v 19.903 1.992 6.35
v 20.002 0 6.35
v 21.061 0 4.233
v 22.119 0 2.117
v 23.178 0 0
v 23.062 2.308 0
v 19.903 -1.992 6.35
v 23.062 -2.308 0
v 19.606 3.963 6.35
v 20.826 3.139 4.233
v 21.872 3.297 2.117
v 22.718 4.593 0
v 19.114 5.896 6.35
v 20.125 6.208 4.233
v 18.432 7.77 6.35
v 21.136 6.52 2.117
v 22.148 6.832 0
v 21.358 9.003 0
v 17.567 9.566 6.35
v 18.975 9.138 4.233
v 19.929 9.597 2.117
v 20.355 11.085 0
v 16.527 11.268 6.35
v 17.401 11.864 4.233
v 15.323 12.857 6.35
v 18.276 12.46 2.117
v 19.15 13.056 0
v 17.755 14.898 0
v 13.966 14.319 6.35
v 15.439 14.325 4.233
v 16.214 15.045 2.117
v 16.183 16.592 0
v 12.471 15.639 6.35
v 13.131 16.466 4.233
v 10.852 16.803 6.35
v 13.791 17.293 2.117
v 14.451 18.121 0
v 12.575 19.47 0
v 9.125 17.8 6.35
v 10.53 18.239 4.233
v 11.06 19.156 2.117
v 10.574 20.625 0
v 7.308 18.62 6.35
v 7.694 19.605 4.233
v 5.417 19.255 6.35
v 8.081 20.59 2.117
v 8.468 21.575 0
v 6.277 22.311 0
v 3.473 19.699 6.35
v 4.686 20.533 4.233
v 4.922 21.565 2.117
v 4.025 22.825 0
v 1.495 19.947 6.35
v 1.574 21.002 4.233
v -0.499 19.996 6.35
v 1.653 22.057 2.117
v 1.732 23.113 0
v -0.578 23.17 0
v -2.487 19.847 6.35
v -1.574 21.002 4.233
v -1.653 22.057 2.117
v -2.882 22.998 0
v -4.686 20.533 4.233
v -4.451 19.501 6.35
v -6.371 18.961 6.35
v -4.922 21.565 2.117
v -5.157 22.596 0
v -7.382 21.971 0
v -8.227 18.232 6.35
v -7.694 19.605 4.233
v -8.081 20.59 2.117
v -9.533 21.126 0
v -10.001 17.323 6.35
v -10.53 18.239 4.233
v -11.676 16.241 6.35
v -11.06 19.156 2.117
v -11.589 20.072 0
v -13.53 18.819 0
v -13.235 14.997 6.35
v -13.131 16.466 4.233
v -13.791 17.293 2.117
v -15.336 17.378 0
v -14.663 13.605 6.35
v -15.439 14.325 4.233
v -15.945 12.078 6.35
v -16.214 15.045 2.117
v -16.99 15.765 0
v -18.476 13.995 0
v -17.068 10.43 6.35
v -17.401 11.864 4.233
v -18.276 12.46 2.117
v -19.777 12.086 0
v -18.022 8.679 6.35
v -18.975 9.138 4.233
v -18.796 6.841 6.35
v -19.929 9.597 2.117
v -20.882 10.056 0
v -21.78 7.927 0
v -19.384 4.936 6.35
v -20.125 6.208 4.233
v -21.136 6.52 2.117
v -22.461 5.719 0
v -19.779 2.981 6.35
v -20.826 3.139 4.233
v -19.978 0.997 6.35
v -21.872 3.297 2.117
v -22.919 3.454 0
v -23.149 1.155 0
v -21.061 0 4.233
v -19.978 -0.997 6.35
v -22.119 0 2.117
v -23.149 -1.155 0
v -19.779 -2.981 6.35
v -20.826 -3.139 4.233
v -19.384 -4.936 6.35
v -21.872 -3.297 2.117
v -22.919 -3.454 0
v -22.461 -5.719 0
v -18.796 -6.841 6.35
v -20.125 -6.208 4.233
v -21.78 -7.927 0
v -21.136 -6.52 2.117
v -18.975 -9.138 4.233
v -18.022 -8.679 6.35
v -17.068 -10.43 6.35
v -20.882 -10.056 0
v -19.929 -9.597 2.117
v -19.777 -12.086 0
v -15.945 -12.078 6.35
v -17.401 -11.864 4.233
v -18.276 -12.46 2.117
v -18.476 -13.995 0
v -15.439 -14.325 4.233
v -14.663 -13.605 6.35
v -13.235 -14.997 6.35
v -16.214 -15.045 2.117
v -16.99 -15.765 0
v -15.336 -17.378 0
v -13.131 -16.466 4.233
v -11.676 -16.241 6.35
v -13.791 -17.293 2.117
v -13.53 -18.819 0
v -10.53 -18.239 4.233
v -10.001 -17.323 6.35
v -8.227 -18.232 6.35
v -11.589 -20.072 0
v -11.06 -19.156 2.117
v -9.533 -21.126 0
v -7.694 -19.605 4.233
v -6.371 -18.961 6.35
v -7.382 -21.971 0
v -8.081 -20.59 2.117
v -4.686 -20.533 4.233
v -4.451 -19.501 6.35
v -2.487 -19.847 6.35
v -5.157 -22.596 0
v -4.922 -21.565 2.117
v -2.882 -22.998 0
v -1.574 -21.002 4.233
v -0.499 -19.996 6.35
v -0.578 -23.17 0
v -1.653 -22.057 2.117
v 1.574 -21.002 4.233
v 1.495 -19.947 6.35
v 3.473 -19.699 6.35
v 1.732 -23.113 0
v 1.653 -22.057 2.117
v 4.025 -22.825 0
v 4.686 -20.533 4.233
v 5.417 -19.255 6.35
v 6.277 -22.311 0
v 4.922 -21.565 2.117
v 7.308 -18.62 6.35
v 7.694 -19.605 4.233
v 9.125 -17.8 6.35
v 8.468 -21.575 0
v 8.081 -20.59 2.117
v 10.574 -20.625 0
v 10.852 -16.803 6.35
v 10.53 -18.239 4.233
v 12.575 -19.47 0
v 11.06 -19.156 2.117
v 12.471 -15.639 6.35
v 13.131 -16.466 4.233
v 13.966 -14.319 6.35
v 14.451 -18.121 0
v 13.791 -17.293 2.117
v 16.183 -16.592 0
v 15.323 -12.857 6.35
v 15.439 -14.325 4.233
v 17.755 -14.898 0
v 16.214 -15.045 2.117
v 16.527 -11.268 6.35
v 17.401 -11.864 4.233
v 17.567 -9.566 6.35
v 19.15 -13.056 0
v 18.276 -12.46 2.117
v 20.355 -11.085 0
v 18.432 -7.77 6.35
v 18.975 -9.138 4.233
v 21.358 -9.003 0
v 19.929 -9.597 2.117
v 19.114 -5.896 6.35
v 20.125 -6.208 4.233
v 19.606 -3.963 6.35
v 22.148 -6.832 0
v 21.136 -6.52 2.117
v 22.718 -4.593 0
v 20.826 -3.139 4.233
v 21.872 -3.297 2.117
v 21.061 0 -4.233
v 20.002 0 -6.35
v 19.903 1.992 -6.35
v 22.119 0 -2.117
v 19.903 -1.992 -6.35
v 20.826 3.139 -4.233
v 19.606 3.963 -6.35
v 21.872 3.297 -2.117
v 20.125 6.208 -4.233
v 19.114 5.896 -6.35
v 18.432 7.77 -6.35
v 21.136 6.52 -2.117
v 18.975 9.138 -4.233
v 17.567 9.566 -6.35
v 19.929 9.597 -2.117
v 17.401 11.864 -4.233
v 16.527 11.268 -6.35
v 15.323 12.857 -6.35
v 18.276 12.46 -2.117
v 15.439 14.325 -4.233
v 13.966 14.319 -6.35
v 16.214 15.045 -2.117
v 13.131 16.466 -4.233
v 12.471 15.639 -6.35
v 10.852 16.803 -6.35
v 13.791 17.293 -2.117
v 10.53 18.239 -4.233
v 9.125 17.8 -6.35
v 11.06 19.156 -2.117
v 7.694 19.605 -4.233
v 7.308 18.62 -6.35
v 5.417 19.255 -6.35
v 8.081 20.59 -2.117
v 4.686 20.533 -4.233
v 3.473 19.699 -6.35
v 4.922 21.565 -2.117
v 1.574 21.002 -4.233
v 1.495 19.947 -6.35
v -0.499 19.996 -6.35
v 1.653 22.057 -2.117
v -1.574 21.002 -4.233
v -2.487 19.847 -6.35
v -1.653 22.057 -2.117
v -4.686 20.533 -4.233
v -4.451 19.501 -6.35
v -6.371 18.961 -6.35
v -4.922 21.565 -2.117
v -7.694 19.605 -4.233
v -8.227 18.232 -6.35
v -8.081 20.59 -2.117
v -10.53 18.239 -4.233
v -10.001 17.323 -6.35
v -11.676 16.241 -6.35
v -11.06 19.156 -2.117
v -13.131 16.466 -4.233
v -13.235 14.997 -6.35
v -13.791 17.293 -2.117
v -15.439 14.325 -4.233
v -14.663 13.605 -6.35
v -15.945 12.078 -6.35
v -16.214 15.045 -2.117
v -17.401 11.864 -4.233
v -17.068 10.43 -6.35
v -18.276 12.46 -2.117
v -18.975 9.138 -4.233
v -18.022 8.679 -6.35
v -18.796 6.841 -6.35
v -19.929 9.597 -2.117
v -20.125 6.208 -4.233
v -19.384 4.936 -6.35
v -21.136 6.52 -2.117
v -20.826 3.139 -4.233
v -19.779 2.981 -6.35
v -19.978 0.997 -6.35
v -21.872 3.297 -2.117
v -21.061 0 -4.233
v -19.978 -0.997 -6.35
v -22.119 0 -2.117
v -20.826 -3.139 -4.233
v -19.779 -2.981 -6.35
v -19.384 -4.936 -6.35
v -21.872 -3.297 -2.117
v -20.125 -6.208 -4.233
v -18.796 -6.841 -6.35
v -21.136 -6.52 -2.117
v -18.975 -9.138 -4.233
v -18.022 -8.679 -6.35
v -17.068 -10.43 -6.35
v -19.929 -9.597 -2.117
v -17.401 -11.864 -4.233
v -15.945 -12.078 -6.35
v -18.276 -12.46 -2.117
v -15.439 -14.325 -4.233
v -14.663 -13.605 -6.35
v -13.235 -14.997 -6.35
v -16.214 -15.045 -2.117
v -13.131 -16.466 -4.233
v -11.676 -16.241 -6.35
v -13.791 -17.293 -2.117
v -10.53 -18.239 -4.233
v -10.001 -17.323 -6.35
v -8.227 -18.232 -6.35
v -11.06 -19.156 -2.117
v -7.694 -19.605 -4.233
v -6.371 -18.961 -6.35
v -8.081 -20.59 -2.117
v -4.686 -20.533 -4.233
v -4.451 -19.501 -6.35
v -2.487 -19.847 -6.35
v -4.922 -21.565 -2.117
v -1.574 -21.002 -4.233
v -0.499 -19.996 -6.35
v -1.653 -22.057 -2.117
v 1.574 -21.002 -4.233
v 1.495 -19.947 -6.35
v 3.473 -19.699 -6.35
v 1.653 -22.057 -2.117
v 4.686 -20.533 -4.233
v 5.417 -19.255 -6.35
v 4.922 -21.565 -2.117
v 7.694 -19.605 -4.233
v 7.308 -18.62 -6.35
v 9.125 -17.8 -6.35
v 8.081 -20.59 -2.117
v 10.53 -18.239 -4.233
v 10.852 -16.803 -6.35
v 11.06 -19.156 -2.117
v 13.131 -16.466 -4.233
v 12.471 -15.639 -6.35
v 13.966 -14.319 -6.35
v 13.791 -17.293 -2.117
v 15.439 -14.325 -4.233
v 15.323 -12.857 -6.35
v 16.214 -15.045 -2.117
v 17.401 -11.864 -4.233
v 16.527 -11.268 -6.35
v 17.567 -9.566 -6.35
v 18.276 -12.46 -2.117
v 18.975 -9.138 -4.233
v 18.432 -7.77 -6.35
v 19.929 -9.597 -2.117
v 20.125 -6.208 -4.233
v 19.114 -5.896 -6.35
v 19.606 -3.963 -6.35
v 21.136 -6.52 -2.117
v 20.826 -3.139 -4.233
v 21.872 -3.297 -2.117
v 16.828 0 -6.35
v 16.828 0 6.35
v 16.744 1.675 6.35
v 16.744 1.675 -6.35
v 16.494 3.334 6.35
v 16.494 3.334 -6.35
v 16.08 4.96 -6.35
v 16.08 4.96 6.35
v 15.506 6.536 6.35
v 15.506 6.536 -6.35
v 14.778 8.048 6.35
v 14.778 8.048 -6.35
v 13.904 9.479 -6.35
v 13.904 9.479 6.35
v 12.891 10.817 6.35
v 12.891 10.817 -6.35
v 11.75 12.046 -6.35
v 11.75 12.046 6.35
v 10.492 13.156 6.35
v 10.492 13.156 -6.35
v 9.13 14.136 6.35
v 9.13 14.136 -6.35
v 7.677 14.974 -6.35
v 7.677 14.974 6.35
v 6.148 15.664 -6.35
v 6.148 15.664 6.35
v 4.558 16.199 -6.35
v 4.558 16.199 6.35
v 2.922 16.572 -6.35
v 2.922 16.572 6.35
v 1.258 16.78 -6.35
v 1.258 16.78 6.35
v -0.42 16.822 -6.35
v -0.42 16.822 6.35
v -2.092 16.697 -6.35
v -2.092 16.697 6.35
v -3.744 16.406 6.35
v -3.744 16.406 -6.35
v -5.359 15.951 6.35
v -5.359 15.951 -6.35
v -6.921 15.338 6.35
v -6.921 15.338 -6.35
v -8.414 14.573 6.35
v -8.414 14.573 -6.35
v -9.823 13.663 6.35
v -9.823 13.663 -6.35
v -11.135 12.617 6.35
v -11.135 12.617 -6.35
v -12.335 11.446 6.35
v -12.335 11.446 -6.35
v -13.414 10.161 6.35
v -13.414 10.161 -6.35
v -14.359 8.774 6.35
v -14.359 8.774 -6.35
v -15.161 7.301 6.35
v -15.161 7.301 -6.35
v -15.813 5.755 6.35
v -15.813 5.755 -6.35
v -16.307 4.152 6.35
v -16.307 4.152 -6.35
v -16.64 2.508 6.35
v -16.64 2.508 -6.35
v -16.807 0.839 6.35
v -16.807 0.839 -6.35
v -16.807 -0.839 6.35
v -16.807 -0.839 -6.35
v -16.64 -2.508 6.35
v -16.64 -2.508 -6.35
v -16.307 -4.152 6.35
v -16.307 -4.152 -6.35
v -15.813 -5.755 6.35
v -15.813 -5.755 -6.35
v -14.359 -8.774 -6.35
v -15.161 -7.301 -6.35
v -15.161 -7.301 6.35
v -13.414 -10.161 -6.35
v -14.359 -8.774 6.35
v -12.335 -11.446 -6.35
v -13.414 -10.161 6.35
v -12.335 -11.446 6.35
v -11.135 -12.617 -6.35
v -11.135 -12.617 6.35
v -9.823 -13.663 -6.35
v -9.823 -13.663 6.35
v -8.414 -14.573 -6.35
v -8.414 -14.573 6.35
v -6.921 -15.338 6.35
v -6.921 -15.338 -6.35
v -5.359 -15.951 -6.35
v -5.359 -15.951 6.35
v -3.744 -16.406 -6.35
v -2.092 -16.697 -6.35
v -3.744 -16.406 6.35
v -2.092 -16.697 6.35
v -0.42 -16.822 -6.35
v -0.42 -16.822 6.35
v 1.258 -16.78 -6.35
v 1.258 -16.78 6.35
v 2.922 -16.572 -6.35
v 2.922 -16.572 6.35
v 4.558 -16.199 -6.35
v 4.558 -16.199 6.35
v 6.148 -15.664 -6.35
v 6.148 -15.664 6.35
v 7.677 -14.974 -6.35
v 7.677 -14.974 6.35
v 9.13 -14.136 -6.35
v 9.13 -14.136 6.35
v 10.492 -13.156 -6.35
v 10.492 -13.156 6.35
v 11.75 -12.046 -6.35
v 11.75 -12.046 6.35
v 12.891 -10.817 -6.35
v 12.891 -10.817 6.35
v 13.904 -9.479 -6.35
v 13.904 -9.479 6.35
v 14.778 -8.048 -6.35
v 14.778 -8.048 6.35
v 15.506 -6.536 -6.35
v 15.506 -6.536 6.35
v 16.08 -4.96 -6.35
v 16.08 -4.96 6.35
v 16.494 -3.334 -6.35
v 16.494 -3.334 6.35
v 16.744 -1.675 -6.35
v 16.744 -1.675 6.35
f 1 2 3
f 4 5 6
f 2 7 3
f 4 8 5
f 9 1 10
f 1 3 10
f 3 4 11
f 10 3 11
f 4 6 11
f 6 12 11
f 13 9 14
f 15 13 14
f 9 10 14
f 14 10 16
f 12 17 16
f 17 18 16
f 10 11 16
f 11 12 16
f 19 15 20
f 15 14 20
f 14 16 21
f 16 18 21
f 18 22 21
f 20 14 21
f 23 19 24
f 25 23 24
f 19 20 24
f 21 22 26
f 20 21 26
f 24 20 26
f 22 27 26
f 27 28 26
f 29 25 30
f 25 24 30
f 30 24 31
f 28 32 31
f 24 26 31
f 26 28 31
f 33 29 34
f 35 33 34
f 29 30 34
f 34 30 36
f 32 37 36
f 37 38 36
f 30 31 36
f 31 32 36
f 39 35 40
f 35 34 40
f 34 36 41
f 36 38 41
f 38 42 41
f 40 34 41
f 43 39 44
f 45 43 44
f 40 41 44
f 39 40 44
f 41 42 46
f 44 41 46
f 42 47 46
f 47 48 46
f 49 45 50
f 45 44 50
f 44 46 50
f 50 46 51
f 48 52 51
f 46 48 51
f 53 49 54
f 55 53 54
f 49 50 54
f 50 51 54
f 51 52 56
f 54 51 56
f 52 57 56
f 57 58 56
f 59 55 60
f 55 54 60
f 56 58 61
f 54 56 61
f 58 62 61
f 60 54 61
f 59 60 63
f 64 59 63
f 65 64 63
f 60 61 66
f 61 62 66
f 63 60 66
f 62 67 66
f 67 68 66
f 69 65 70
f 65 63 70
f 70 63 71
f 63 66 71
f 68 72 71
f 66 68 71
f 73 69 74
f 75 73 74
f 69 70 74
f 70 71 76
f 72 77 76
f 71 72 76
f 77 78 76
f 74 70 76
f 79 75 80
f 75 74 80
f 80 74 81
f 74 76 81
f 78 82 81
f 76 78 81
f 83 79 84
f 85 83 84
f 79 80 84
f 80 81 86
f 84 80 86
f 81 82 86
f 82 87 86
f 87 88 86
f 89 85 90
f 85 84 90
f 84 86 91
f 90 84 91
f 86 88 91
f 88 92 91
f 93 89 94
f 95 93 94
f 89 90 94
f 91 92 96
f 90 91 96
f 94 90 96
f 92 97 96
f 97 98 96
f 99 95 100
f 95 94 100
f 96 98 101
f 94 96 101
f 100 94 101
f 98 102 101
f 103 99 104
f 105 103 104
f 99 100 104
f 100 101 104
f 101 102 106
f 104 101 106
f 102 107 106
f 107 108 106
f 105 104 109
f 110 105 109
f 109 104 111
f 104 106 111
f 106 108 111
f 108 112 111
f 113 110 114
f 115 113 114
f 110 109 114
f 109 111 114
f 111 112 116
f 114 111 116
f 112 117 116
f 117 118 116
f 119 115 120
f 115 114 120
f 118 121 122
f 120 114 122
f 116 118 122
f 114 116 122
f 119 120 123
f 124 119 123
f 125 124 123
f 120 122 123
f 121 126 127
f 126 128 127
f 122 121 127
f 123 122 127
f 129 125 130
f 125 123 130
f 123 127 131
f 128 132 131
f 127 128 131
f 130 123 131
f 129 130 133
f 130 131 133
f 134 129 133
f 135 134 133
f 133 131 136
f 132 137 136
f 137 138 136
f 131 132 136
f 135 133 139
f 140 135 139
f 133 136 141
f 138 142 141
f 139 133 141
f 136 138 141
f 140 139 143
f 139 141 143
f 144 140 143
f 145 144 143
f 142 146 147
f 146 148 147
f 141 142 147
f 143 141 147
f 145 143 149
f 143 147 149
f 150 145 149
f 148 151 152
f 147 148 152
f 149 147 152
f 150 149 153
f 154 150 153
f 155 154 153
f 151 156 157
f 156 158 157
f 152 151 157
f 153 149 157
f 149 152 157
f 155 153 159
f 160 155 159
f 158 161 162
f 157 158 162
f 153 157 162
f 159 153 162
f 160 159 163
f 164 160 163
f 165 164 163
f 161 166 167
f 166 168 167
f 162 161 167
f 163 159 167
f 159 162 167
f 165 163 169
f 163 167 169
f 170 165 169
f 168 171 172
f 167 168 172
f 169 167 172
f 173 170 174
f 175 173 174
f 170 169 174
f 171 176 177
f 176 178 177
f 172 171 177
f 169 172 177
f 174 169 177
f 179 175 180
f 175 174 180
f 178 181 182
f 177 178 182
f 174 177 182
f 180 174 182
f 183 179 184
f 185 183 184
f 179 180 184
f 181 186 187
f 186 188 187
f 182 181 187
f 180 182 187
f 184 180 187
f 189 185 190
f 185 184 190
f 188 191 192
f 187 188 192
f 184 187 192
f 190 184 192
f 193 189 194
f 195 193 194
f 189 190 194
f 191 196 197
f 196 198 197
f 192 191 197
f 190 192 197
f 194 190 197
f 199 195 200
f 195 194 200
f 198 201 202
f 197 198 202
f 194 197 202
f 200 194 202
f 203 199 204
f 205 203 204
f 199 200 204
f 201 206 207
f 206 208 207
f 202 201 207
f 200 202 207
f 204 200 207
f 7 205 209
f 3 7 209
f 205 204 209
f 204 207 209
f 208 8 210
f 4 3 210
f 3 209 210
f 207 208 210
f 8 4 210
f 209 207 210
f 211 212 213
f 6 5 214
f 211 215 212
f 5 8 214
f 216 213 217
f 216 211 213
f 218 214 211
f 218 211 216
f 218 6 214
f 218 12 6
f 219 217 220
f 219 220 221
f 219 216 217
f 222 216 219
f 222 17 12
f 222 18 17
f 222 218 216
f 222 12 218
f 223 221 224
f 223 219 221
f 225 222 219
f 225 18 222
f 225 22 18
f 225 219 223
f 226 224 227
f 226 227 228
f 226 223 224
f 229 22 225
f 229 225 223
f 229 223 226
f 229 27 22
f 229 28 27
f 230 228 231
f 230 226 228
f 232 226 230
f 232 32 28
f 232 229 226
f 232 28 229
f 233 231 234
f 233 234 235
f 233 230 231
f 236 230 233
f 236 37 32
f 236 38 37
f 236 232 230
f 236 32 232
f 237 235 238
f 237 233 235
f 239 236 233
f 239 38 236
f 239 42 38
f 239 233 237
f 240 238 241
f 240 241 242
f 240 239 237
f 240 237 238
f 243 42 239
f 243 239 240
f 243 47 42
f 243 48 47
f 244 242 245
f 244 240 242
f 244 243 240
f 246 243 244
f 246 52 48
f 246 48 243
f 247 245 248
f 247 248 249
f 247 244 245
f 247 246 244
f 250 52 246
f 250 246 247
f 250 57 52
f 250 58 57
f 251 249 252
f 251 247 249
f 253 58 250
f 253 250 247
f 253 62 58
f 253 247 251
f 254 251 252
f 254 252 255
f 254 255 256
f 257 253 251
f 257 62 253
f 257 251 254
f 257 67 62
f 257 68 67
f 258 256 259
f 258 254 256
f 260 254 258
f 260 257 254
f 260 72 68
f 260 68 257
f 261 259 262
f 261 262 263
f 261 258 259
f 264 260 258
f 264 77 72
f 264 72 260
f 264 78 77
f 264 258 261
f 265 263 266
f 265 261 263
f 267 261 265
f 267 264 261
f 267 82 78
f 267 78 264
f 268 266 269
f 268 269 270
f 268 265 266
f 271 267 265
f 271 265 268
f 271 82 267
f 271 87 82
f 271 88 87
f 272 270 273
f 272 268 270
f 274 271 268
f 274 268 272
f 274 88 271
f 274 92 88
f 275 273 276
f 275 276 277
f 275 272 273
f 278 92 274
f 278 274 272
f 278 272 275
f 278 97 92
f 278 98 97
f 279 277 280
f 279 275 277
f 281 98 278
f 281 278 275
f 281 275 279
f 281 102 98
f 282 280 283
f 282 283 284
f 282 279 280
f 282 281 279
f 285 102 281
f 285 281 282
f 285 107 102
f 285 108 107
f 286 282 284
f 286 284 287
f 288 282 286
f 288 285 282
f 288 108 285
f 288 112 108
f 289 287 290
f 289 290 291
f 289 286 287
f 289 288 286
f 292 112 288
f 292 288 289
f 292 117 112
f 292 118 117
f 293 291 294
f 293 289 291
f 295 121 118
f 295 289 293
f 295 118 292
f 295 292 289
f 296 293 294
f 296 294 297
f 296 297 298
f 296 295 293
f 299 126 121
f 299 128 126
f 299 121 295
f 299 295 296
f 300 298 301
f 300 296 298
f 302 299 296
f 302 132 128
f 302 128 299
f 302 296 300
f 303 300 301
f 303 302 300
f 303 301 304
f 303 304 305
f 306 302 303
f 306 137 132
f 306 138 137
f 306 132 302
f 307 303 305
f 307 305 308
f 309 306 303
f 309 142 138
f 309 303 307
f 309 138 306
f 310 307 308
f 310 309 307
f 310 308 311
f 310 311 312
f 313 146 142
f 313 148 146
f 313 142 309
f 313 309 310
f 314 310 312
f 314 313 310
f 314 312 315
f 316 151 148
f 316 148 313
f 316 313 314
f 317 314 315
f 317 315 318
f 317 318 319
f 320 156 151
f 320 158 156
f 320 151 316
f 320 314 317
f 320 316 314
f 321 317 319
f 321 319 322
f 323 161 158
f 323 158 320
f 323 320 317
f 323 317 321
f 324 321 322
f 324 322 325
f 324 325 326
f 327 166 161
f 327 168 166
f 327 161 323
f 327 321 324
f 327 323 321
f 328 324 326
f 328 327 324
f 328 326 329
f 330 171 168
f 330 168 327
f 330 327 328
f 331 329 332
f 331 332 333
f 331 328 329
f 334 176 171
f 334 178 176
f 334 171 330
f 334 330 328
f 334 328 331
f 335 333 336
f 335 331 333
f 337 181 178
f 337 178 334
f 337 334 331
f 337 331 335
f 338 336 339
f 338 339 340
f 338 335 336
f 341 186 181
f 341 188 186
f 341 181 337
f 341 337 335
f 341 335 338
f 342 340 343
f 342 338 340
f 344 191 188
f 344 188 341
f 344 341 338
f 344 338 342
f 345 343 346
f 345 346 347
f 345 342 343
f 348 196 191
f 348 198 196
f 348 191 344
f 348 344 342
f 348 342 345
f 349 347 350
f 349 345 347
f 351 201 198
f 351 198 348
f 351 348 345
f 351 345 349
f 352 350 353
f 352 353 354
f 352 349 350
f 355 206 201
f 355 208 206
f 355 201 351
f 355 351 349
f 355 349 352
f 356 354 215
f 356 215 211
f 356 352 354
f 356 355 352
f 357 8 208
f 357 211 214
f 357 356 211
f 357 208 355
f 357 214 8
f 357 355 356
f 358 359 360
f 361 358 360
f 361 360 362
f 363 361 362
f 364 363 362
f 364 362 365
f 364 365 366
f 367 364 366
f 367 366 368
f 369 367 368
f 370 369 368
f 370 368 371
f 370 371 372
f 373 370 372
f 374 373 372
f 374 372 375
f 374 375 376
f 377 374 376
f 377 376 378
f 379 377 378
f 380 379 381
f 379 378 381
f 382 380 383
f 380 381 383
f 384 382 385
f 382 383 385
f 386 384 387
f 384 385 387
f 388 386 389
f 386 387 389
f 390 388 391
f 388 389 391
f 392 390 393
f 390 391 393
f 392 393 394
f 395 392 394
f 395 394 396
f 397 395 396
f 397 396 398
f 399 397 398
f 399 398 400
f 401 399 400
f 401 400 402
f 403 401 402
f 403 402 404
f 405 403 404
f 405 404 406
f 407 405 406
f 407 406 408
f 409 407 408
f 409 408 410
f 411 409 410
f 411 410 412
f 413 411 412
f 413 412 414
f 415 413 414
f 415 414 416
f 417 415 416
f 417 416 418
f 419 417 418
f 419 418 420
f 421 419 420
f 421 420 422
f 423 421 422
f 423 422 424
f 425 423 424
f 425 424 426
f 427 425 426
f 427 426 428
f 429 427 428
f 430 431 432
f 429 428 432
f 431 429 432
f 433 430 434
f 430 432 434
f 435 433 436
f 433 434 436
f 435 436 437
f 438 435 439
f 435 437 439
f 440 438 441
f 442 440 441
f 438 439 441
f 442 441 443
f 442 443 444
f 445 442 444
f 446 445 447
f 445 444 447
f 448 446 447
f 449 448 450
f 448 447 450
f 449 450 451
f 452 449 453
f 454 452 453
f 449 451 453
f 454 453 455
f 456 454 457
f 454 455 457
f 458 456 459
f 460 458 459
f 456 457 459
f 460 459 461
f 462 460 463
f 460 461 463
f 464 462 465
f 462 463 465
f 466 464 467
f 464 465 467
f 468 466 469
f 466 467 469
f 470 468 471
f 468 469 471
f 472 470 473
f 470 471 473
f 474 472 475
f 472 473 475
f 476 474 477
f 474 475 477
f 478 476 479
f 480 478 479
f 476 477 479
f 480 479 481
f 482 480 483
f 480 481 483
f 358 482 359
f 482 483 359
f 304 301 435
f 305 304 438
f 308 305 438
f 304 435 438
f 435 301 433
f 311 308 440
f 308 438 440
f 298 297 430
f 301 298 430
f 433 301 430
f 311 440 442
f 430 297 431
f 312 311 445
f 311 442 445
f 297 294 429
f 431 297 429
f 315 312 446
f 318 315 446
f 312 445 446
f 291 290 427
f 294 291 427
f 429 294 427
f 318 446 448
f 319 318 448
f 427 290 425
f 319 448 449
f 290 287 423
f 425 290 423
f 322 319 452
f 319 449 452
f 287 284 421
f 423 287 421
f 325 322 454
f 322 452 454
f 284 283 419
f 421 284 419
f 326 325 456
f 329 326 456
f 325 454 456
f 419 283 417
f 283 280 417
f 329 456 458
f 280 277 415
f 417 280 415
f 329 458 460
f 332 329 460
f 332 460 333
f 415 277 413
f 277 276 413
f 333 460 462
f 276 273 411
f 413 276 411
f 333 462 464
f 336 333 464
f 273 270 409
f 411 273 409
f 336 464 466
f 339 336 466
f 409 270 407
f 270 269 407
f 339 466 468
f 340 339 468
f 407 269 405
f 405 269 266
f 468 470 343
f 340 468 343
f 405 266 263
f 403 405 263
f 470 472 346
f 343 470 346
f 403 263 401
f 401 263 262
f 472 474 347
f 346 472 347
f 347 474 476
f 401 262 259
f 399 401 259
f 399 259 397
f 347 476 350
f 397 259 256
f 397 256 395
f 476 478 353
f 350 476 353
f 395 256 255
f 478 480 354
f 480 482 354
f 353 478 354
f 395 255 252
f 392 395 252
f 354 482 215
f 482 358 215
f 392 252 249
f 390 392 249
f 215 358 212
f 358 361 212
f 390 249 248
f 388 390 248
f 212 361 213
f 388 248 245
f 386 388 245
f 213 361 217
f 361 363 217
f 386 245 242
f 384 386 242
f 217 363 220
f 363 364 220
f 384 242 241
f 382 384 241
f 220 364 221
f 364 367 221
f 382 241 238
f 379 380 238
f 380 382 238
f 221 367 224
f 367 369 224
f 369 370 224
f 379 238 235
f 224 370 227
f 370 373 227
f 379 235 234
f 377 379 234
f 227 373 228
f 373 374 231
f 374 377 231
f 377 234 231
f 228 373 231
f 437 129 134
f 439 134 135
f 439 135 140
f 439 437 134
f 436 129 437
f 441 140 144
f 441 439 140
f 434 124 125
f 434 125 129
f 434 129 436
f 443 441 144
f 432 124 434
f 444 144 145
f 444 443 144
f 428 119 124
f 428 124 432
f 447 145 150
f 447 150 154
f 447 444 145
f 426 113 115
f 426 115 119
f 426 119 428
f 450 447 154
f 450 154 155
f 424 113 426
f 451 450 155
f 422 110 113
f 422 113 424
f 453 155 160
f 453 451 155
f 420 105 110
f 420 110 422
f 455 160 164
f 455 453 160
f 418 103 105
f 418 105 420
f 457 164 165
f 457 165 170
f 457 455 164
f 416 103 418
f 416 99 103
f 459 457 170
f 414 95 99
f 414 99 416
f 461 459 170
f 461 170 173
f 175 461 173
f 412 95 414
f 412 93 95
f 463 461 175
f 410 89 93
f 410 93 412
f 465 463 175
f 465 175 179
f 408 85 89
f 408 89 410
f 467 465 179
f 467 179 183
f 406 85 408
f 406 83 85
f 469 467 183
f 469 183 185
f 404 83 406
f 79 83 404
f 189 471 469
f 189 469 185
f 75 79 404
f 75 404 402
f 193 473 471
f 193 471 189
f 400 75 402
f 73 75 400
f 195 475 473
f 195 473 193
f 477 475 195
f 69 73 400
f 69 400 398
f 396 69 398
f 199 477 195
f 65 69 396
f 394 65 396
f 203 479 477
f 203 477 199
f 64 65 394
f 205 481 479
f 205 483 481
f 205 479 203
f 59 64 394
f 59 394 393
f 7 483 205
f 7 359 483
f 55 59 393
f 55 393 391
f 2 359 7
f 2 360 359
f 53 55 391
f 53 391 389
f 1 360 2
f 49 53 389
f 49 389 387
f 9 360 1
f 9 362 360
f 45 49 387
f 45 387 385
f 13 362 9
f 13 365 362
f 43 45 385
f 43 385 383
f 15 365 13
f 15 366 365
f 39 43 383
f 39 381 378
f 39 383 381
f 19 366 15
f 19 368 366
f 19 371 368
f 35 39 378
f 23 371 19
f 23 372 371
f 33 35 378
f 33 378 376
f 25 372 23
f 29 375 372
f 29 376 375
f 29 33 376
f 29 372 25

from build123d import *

# Parameters (mm, degrees)
F0_R     = 20.0025
F0_R_2   = 16.8275
F1_DEPTH = 6.35
F3_R     = 20.0025
F2_R     = 23.1775
F6_R     = 16.8275
F7_DEPTH = 12.701


with BuildPart() as f1:
    # F0 (on Top) → F1 (new body)
    with BuildSketch(Plane.XY):
        Circle(F0_R)
        Circle(F0_R_2, mode=Mode.SUBTRACT)
    extrude(amount=F1_DEPTH)

    # F3 (on face) → F4 section 0
    with BuildSketch(Plane.XY.offset(6.35)):
        Circle(F3_R)
    # F2 (on Top) → F4 section 1
    with BuildSketch(Plane.XY):
        Circle(F2_R)
    loft()

    # F5: F1 across plane


with BuildPart() as f1_1:
    add(f1.part)
    add(f1.part.mirror(Plane.XY))

    # F6 (on face) → F7 (cut, through all)
    with BuildSketch(Plane.XY.offset(6.35)):
        Circle(F6_R)
    extrude(amount=-F7_DEPTH, mode=Mode.SUBTRACT)


solid = f1_1.part
